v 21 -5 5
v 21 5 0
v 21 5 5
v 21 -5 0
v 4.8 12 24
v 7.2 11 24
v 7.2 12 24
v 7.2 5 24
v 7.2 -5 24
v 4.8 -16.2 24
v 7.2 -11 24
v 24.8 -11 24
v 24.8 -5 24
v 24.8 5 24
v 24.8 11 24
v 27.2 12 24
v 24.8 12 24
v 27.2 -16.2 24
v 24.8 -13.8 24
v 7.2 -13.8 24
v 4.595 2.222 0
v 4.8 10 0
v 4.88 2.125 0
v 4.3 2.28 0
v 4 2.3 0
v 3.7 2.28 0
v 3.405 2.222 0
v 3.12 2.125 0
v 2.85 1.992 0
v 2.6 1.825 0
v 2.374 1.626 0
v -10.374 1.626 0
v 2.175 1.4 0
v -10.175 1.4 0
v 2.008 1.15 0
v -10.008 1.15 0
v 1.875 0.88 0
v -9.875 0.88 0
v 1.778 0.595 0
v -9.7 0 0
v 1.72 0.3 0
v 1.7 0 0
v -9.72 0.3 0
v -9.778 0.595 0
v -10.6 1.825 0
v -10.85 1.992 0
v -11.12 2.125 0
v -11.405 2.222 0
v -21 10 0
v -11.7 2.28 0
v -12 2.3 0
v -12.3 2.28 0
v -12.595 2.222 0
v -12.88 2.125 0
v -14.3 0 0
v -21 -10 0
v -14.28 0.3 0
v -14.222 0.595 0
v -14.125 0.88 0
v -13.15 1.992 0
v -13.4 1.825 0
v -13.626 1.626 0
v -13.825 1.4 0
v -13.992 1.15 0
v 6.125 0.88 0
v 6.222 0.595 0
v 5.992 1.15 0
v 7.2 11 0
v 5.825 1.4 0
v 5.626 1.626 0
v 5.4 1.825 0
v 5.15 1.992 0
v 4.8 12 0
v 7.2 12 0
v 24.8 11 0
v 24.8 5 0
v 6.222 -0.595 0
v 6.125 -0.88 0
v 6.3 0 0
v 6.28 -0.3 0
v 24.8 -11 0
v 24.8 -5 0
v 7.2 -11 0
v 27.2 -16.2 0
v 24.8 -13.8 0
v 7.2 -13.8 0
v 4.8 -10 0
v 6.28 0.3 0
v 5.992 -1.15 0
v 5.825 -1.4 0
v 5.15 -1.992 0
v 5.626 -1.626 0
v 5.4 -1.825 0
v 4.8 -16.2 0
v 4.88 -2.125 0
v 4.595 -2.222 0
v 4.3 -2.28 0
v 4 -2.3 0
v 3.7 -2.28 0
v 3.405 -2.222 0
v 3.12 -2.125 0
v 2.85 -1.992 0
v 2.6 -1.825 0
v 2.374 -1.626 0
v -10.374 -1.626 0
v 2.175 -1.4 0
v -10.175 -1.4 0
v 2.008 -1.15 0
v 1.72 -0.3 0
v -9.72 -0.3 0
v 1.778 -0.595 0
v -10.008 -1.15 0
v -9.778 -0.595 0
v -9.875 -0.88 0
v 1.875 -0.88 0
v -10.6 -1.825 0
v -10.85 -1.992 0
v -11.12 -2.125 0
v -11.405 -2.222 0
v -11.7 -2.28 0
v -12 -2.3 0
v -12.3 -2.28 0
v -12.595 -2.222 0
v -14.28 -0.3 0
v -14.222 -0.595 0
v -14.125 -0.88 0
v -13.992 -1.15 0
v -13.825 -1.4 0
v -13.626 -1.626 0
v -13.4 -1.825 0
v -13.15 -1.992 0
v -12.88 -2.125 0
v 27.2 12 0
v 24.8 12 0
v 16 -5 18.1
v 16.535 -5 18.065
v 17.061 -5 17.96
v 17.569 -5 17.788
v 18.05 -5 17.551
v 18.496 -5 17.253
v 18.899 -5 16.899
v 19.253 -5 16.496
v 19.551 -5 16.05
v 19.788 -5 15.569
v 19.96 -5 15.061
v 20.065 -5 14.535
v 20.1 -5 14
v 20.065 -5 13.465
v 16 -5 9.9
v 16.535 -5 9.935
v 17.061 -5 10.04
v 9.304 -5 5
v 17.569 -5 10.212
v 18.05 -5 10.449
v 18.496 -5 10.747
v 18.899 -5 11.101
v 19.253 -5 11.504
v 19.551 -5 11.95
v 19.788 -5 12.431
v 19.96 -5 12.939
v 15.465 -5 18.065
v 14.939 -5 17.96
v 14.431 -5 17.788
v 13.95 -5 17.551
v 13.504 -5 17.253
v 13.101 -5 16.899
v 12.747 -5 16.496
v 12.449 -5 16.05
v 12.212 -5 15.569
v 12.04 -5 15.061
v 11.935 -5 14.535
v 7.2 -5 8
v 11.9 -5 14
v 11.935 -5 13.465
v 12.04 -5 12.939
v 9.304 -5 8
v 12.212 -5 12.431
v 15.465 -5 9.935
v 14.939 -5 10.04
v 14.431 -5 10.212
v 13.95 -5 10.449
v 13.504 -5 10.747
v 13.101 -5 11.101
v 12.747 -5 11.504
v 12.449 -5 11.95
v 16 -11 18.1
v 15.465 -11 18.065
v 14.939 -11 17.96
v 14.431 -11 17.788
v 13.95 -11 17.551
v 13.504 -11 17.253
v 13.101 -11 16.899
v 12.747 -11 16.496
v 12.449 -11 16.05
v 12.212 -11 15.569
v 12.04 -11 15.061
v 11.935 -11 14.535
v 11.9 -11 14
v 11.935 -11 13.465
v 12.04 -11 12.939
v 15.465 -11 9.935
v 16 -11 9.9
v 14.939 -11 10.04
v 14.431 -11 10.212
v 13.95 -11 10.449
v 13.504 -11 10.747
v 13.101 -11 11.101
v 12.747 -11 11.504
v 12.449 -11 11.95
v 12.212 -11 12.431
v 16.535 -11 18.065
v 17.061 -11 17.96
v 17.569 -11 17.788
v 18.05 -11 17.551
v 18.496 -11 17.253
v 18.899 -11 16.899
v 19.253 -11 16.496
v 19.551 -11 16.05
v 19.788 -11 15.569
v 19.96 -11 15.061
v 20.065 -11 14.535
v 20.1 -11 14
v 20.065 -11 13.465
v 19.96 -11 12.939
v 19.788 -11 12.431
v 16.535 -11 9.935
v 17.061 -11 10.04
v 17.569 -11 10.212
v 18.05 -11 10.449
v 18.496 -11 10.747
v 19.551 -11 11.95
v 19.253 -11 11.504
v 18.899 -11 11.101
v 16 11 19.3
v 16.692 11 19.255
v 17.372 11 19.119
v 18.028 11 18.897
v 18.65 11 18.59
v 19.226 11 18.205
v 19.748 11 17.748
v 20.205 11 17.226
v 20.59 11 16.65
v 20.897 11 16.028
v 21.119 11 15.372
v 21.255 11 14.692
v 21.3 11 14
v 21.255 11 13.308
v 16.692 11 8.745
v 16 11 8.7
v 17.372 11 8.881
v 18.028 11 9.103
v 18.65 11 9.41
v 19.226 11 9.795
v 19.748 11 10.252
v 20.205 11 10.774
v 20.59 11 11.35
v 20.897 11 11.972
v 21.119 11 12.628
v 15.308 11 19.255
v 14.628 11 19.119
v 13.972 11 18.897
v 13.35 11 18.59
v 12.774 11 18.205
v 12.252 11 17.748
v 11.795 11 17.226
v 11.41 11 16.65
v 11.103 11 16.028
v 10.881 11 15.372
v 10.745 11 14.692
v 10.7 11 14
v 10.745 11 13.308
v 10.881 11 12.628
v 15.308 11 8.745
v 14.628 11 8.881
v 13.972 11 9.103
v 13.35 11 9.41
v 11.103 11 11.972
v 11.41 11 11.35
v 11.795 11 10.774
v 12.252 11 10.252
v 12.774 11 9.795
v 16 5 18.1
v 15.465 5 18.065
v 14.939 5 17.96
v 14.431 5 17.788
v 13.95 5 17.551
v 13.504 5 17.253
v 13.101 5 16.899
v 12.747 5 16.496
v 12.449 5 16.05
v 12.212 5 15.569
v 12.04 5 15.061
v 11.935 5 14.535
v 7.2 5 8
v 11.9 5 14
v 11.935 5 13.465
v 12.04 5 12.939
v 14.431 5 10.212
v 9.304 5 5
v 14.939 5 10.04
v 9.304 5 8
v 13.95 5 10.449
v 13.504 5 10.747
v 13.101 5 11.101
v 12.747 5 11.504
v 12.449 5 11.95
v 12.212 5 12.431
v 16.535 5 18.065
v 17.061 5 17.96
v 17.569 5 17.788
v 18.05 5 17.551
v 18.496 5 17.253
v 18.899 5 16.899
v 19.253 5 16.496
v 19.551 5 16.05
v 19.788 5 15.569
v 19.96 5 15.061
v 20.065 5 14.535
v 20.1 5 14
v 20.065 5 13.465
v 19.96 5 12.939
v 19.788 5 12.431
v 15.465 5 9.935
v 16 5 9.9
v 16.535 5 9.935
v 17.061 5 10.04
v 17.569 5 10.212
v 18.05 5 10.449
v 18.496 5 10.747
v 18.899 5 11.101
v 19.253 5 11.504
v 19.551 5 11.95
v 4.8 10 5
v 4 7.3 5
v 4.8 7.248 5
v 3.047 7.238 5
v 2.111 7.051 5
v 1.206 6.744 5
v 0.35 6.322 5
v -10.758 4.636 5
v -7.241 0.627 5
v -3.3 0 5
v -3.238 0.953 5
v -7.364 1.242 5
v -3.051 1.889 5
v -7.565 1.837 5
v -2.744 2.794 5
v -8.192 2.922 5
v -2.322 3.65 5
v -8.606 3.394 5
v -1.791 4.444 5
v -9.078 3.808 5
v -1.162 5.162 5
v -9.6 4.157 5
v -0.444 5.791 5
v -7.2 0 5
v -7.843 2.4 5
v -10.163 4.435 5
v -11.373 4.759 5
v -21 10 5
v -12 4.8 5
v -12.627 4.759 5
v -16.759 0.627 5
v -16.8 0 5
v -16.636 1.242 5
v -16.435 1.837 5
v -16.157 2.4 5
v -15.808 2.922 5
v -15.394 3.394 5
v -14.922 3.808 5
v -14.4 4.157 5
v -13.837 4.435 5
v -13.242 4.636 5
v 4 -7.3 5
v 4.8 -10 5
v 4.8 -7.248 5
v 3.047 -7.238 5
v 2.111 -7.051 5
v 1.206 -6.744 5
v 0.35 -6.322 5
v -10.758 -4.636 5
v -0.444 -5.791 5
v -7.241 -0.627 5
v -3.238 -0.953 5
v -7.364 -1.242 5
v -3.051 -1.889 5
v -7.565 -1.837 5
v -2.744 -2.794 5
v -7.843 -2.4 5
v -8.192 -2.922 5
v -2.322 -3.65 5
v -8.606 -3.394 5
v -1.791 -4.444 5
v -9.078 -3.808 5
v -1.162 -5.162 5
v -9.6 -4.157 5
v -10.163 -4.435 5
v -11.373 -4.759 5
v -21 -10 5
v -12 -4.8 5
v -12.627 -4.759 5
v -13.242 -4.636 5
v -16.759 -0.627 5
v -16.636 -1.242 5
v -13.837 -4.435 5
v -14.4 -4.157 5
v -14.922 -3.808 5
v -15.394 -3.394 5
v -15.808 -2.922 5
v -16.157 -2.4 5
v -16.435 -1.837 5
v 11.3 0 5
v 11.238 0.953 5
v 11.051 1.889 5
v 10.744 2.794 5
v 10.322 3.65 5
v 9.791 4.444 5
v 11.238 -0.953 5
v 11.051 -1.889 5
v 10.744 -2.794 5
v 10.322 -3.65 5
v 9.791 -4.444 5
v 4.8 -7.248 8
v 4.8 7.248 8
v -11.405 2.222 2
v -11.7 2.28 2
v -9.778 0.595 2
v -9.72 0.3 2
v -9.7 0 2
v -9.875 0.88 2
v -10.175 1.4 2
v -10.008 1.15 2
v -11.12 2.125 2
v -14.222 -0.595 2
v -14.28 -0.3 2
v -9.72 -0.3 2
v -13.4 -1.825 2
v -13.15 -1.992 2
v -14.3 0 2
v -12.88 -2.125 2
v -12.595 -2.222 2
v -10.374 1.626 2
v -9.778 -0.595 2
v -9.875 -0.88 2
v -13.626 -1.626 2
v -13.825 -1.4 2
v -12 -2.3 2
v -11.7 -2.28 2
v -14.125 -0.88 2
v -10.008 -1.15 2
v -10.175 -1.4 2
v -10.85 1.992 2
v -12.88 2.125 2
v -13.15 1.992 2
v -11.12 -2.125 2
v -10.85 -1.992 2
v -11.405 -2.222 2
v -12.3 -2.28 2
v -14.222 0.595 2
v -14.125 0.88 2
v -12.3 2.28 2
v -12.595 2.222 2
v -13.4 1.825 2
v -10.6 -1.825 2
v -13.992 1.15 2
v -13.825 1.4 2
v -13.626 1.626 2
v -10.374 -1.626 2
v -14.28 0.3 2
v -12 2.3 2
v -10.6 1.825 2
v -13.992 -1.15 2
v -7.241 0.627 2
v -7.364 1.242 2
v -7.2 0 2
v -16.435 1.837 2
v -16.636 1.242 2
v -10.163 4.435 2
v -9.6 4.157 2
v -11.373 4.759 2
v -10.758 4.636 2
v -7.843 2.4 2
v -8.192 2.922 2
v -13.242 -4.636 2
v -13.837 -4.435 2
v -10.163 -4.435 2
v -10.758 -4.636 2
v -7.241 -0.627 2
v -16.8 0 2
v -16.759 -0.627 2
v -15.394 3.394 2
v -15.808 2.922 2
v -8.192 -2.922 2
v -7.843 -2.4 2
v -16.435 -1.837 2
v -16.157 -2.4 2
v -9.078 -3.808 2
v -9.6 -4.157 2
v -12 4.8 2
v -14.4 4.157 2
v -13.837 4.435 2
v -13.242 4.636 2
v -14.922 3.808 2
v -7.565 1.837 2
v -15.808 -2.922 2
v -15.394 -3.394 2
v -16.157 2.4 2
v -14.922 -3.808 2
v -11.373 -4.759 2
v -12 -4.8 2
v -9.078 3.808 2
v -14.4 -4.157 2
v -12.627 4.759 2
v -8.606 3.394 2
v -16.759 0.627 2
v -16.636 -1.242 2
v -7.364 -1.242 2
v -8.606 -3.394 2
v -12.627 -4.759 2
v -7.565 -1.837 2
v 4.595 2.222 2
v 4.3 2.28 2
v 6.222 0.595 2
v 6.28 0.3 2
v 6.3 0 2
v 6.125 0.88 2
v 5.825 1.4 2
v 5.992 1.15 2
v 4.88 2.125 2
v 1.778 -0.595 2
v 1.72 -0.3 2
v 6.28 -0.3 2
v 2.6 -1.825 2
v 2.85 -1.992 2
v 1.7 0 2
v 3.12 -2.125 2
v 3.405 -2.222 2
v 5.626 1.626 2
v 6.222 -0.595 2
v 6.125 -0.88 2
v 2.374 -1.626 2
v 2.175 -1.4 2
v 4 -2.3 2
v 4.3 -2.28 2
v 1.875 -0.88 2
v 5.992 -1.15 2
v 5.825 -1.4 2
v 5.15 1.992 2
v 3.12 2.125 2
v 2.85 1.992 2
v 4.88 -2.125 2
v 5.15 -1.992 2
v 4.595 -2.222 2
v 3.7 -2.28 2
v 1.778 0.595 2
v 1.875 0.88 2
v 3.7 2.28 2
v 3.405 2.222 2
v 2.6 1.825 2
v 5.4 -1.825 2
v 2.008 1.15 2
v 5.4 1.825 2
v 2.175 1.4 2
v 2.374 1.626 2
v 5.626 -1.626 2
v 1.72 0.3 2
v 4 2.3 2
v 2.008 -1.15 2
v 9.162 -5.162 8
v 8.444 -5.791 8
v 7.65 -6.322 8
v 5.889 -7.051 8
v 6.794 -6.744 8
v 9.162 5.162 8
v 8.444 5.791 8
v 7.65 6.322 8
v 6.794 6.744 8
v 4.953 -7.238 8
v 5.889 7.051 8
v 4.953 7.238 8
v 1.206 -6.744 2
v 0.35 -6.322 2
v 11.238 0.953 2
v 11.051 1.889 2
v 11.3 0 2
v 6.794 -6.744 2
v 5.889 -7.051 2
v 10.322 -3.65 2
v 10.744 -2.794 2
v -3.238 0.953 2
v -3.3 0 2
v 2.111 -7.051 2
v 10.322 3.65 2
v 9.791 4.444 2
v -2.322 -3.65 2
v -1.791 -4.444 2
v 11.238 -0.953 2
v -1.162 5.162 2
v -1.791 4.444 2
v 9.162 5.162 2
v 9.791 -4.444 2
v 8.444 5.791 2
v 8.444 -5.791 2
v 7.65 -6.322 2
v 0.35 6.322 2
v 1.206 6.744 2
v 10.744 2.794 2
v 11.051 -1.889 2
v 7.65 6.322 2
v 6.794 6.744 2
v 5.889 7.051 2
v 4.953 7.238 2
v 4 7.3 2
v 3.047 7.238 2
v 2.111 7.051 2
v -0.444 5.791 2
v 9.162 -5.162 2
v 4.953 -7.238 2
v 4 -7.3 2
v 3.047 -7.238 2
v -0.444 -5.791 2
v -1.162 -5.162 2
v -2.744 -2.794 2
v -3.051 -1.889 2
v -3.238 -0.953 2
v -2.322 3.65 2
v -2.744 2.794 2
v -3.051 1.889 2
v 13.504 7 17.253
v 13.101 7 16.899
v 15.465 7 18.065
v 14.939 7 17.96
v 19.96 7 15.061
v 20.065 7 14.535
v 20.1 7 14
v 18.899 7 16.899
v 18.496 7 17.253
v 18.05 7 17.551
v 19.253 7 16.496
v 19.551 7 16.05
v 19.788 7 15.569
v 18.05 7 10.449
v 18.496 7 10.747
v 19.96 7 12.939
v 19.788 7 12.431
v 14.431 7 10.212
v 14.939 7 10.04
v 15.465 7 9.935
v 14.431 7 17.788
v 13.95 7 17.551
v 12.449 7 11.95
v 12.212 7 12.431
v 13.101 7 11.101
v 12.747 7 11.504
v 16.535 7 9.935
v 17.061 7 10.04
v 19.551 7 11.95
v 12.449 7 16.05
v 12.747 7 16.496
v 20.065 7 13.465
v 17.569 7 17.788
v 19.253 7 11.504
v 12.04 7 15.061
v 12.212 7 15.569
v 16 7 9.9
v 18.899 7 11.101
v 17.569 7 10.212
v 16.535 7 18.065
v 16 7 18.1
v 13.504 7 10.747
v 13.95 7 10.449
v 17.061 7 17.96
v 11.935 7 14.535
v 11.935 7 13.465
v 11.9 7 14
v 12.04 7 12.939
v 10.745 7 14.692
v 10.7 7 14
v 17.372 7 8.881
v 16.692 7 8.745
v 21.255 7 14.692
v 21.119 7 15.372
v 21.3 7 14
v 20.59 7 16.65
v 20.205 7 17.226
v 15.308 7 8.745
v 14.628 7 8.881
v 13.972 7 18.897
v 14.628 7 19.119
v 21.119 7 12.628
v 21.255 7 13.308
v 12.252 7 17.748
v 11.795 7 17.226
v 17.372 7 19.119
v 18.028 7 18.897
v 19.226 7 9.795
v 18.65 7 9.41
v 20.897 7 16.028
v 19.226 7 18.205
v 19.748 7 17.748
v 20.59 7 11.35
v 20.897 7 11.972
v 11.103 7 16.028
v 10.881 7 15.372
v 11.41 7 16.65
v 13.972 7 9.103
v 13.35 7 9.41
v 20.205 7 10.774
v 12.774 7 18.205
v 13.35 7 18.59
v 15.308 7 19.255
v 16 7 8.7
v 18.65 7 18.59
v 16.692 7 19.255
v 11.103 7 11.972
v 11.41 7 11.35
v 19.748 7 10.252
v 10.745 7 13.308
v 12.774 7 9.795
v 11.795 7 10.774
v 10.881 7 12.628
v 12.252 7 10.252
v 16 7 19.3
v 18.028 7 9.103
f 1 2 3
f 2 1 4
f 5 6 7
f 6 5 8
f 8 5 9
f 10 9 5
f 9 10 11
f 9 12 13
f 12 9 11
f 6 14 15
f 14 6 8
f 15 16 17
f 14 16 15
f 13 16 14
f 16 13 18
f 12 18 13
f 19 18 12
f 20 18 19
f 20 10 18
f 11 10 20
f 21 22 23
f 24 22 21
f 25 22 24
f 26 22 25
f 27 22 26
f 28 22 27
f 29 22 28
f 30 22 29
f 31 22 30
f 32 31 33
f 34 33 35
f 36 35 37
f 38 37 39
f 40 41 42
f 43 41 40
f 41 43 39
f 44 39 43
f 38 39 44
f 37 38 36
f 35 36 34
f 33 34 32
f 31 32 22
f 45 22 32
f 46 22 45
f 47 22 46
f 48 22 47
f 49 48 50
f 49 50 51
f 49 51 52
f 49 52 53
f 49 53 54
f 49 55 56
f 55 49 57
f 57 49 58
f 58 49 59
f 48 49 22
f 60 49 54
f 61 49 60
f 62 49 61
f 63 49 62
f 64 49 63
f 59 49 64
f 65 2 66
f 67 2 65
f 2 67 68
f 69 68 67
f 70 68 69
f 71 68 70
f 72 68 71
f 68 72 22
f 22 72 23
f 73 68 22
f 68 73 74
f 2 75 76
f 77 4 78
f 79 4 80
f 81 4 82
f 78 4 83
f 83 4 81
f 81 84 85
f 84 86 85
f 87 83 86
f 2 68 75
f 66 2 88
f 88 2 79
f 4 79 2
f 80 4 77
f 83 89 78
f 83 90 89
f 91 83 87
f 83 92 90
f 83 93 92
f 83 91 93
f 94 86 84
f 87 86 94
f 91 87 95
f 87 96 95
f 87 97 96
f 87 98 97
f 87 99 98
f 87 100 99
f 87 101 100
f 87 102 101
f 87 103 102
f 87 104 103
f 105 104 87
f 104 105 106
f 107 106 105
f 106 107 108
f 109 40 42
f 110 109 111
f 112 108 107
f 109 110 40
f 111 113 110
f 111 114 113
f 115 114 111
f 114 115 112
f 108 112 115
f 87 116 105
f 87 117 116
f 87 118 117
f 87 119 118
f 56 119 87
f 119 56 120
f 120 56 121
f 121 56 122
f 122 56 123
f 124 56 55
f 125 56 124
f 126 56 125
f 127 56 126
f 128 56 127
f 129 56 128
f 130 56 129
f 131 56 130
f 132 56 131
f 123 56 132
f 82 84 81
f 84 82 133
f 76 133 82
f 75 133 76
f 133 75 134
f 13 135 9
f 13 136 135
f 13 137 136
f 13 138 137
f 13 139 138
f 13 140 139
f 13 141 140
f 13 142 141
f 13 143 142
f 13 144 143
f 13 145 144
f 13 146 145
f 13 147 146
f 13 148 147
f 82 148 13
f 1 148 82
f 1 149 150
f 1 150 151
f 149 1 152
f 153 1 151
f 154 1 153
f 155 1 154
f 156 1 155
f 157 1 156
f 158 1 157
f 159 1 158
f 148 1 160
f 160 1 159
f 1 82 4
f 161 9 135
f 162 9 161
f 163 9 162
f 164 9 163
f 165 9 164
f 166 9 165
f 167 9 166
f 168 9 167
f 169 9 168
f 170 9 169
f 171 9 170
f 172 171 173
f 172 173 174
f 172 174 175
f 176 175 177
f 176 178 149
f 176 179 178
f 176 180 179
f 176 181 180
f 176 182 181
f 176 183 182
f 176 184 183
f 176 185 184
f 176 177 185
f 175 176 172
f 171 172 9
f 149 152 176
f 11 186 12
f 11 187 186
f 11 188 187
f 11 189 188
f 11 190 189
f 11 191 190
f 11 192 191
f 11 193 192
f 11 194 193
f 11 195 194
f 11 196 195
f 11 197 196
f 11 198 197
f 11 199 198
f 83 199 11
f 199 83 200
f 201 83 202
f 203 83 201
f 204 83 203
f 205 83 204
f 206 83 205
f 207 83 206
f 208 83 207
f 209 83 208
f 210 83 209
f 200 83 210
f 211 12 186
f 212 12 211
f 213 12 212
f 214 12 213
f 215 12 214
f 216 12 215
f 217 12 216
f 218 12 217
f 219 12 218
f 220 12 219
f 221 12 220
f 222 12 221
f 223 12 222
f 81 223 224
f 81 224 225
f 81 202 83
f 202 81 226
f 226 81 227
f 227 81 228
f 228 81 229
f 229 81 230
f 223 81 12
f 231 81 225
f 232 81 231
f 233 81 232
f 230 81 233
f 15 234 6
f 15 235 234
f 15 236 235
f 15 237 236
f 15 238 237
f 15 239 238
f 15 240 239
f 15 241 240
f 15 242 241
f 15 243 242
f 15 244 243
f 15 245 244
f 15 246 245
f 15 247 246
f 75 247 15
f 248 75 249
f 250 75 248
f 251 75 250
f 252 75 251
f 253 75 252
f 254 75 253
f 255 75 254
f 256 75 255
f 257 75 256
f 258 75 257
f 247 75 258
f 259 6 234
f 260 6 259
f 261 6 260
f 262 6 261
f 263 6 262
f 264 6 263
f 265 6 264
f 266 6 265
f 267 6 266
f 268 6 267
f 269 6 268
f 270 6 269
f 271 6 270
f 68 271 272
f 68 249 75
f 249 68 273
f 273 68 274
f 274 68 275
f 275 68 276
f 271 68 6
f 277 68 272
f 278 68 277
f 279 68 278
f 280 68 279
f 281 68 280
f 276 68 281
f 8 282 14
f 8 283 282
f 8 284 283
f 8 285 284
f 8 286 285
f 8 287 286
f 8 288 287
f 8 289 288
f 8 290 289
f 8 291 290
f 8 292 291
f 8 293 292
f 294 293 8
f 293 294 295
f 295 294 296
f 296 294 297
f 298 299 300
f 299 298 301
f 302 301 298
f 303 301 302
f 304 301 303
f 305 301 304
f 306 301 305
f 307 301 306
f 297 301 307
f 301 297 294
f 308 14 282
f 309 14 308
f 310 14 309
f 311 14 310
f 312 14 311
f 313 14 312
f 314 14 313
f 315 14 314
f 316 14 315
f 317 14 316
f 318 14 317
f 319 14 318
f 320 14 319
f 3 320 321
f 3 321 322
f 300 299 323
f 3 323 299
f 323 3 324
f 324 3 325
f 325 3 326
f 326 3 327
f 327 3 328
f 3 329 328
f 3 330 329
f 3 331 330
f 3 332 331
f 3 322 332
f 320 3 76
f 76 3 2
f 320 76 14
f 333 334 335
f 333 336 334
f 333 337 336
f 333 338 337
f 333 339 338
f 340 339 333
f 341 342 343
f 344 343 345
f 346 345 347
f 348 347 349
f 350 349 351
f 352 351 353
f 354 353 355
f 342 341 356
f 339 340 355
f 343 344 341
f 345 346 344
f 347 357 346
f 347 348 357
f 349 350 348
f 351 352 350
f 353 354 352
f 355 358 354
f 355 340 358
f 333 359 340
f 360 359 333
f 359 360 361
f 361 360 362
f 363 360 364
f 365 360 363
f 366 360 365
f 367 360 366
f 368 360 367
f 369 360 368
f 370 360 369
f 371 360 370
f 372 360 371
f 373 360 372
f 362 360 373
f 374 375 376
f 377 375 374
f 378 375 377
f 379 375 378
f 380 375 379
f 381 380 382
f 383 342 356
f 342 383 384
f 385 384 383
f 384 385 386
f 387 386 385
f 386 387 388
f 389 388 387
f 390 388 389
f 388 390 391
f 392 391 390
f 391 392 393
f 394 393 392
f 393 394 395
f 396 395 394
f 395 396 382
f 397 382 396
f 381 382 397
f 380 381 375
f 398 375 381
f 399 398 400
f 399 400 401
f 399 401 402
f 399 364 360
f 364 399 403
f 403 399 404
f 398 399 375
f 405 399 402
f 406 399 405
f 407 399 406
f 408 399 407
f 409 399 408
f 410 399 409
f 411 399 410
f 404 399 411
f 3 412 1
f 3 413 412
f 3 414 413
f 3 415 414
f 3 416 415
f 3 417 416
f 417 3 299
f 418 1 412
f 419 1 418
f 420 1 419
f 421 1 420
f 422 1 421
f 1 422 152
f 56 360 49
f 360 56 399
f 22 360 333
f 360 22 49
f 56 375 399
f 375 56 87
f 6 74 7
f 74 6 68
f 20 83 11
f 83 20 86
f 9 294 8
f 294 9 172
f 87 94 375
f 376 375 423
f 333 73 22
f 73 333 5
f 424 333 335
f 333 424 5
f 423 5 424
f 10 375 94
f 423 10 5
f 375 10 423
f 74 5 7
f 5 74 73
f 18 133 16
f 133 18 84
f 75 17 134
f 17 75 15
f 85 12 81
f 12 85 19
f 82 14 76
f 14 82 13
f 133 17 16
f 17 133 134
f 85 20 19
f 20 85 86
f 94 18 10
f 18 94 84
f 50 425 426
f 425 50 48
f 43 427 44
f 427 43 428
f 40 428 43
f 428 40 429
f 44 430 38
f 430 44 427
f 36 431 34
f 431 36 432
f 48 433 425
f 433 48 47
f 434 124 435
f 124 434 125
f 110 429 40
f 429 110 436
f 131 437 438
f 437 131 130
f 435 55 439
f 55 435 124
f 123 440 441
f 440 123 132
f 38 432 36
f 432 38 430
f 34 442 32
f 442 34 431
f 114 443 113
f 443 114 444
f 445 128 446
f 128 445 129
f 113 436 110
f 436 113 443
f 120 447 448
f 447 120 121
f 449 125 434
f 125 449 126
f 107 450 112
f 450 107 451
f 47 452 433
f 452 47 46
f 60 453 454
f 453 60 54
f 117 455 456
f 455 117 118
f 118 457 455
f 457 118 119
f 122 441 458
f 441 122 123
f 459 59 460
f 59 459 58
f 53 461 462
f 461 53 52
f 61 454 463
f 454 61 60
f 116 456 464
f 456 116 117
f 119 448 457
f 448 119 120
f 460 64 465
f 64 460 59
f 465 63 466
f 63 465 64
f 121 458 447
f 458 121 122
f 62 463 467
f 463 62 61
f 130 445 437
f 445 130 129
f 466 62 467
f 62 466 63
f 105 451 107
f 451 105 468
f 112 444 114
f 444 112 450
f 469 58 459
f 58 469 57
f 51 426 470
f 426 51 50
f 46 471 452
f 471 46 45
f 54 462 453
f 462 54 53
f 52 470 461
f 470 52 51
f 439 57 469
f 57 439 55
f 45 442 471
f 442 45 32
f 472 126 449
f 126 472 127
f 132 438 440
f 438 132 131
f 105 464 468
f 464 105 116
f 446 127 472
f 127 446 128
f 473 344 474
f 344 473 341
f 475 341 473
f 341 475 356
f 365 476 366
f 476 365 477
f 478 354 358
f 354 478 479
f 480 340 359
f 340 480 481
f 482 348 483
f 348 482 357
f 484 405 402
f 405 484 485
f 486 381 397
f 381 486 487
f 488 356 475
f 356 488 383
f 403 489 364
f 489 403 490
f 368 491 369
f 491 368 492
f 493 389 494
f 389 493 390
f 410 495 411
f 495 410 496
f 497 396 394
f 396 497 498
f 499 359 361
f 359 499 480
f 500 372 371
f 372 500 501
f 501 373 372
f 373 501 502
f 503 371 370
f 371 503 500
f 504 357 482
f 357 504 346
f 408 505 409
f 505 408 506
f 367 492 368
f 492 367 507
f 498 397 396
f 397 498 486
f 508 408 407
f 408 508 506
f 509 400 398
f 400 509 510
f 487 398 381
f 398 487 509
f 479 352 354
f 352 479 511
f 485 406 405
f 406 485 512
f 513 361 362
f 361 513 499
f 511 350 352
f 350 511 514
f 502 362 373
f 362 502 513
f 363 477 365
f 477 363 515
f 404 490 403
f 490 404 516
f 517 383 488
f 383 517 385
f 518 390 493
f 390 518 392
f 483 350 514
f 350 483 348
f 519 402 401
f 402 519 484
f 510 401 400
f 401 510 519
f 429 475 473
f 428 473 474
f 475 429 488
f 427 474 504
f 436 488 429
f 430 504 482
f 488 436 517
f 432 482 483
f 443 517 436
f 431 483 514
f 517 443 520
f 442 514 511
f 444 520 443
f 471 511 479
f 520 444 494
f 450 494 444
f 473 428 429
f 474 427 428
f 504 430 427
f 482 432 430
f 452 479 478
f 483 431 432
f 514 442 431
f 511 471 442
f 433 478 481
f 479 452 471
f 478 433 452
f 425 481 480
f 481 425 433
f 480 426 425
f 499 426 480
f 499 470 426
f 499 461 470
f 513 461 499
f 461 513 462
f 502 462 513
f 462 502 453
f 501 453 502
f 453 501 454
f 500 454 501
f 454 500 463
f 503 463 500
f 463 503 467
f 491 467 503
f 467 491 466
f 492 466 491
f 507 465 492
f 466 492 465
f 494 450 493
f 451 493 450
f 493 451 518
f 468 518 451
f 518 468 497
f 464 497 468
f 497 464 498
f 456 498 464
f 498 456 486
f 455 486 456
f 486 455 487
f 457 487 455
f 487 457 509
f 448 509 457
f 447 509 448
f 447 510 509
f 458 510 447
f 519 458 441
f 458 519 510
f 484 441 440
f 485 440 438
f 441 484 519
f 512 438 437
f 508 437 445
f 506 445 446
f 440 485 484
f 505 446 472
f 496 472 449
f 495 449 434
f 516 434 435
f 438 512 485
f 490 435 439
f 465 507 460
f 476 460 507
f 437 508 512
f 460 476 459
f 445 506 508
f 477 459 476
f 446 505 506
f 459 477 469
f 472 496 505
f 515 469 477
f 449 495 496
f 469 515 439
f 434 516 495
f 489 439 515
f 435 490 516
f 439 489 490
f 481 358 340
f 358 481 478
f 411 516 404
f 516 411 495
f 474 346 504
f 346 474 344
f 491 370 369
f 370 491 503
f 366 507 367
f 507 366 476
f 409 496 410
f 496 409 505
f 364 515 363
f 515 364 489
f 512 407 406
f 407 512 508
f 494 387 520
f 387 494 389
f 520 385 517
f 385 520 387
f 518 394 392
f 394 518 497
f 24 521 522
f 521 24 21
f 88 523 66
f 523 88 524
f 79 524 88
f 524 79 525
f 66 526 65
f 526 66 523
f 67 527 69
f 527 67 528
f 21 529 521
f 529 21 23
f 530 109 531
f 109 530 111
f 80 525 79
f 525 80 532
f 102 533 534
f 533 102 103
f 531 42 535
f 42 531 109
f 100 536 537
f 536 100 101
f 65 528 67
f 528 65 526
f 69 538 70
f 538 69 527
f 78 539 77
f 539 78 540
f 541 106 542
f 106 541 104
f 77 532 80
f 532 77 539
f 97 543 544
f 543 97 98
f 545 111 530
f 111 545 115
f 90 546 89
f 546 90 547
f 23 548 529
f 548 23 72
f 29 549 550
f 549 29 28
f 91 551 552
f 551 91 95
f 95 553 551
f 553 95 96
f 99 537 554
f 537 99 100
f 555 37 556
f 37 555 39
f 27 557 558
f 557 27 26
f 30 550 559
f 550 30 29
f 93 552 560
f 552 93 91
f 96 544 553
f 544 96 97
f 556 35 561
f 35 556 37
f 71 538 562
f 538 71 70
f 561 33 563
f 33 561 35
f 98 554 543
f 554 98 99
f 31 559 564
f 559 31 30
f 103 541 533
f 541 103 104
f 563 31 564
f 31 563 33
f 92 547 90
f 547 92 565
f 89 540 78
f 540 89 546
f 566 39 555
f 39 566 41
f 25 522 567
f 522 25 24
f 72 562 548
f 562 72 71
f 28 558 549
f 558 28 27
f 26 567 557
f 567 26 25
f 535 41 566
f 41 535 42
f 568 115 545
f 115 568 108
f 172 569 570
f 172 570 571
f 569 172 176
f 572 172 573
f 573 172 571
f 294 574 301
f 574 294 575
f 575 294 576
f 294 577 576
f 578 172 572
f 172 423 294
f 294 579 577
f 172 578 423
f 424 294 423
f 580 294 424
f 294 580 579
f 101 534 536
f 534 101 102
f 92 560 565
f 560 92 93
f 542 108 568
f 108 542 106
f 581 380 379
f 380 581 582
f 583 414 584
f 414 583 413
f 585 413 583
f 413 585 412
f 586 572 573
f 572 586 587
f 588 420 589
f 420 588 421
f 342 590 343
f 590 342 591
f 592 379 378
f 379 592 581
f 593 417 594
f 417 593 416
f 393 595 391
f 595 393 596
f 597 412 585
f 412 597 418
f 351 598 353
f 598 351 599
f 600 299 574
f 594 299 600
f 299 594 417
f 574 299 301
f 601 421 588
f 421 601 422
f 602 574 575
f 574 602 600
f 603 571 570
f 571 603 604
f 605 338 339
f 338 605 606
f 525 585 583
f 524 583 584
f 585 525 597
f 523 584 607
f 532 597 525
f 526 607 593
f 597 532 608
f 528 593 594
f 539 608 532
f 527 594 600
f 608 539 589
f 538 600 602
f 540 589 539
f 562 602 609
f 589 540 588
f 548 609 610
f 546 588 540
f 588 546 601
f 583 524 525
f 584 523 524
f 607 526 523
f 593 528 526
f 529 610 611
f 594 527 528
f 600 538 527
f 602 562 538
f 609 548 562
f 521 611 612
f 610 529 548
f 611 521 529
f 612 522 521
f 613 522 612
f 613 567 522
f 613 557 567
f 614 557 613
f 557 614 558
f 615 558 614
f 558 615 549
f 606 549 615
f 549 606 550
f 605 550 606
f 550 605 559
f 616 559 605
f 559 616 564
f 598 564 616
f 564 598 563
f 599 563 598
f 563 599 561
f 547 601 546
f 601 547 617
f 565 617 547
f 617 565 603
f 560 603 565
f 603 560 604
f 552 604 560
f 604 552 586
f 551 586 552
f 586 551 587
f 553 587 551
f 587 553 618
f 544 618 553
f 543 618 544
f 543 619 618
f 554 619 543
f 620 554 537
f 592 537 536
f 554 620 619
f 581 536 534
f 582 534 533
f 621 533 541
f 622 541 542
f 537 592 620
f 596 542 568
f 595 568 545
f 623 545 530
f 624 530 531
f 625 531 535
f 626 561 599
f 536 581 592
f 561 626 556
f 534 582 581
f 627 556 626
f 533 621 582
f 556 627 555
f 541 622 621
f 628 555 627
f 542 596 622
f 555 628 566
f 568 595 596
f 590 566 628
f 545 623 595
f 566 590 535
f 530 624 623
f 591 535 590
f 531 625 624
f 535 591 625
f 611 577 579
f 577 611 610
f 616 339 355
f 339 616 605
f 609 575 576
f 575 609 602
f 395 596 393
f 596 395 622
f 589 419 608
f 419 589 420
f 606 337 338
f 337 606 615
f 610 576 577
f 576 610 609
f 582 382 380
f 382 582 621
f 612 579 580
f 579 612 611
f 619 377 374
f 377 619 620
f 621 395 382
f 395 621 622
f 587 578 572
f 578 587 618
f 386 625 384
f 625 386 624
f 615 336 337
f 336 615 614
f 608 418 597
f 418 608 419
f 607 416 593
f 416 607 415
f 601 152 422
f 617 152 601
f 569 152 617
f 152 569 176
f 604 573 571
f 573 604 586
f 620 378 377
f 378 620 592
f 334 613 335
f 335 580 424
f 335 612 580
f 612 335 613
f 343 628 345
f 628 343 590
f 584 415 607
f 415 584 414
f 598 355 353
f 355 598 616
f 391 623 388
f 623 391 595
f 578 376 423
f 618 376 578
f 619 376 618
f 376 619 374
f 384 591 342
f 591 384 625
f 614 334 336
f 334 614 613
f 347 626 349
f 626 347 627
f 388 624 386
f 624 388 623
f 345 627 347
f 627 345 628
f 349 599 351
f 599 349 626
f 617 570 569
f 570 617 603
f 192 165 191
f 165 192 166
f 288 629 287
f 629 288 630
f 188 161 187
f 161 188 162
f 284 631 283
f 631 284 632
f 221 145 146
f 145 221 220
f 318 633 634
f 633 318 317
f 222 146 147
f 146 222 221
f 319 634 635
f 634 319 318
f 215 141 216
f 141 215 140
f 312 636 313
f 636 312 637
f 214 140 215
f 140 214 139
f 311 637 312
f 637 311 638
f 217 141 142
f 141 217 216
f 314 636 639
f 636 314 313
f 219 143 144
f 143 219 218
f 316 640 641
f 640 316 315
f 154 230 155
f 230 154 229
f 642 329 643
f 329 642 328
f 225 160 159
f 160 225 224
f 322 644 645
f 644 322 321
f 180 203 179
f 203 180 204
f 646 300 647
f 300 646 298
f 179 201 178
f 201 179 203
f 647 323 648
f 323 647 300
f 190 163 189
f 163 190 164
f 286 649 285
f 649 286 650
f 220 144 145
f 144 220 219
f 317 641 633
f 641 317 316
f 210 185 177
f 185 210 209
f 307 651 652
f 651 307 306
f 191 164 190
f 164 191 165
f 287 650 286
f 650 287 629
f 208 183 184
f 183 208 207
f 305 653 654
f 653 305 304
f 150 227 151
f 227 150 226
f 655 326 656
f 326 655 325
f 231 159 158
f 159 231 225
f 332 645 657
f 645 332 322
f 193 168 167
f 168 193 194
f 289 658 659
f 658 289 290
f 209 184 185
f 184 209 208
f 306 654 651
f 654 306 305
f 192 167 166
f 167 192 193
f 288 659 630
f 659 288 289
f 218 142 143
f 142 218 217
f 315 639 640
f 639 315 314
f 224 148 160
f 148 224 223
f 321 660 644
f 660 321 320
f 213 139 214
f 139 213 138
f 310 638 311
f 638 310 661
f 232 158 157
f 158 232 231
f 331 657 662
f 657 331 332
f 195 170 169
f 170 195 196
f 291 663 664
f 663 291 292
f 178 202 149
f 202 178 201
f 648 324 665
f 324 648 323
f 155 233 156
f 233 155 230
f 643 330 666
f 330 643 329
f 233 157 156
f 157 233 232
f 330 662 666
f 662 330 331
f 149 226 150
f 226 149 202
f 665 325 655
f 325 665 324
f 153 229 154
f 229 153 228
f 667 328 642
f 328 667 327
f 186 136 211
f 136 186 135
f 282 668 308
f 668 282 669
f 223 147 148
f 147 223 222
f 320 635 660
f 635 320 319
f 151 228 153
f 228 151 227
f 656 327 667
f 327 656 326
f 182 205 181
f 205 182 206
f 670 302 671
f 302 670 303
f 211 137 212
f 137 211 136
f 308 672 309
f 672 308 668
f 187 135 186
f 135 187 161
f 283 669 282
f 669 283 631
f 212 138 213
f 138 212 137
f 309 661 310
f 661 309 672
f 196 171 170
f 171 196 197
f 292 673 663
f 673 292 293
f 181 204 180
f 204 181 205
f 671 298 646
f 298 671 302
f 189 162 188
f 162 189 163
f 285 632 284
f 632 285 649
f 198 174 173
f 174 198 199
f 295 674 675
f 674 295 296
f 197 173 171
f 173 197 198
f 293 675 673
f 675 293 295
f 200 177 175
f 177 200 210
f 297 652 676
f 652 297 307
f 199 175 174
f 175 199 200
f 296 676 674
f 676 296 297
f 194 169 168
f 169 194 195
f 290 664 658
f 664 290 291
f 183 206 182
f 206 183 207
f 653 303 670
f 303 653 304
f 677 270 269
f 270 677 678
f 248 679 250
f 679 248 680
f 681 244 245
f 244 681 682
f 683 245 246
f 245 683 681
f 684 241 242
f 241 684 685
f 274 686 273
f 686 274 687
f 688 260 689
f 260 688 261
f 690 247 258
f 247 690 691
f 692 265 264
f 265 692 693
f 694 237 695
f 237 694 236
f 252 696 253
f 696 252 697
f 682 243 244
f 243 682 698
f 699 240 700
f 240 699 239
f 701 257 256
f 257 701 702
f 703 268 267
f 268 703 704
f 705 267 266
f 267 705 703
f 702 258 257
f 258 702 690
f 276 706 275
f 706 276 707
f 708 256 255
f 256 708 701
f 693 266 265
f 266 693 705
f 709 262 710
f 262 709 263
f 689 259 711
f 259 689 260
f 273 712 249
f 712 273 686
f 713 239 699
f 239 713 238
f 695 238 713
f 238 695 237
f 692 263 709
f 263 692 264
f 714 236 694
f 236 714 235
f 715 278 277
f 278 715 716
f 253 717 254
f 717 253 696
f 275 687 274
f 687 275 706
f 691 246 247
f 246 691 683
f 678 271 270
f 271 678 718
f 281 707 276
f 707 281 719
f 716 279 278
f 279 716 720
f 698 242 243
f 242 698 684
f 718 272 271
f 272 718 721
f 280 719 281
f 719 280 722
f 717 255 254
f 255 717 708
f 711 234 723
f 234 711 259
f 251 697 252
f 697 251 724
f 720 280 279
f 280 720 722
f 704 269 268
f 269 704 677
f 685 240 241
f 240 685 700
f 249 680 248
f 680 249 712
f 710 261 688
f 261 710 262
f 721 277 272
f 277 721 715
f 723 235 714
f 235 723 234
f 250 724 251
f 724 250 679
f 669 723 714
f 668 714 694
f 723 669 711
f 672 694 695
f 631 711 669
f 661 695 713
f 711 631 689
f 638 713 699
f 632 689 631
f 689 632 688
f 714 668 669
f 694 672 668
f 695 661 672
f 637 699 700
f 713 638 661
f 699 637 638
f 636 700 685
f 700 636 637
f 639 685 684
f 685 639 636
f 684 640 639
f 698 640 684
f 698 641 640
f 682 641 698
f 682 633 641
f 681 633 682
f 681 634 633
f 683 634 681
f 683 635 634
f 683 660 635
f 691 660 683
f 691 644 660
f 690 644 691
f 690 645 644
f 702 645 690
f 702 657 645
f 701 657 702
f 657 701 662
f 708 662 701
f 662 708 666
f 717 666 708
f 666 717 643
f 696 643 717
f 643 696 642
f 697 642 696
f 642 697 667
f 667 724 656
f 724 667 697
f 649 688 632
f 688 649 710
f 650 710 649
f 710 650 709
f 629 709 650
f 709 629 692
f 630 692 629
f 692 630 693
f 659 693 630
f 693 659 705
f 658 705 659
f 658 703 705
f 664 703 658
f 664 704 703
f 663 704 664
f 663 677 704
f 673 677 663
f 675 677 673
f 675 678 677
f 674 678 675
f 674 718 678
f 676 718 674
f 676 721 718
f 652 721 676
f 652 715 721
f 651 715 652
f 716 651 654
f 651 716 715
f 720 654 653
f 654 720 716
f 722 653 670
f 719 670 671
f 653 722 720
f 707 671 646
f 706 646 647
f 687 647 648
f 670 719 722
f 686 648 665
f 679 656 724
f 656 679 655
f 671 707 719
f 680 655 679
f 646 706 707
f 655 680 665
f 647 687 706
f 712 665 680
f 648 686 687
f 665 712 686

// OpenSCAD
// P2-96 print coupons only. Installed P2-93d/g geometry is unchanged.
use <p293g-tilt-candidate.scad>
use <p293d-arch-candidate.scad>

part = "coupon_foot_seats";

// Local samples of the real X240 and X230 washer seats plus one complete
// Z80 pin clevis. Thin test-only webs keep the coupon a single body.
module coupon_foot_seats() {
  difference() {
    union() {
      // Compact connected carrier; the sampled bores/recesses retain the
      // production diameters and seat stacks.
      translate([0,0,2.5]) cube([42,20,5], center=true);
      for (y=[-8,8]) translate([16,y,12]) cube([10,6,24], center=true);
      // Non-functional spine keeps the four pin-seat quadrants printable;
      // it stays clear of the real bore/head-seat surfaces.
      translate([6,-2,12]) cube([2.4,28,24], center=true);
      for (y=[-8,8]) translate([8.5,y,12]) cube([5,6,24], center=true);
      translate([26,-2,12]) cube([2.4,28,24], center=true);
      for (y=[-8,8]) translate([23.5,y,12]) cube([5,6,24], center=true);
      translate([16,-15,12]) cube([22.4,2.4,24], center=true);
    }
    // X240 OD9.6 seat and X230 OD14.6 seat.
    translate([-12,0,-1]) cylinder(d=4.6,h=9,$fn=48);
    translate([-12,0,2]) cylinder(d=9.6,h=6,$fn=48);
    translate([4,0,-1]) cylinder(d=4.6,h=9,$fn=48);
    translate([4,0,2]) cylinder(d=14.6,h=6,$fn=48);
    // One real foot pin stack: Ø8.2 sleeve bore and Ø10.6 head recess.
    translate([16,0,14]) rotate([90,0,0]) cylinder(d=8.2,h=24,center=true,$fn=48);
    translate([16,9,14]) rotate([90,0,0]) cylinder(d=10.6,h=4,center=true,$fn=48);
  }
}

// Real knee section containing both through-pin bores at Z80 and Z114.
module coupon_knee_pins() {
  difference() {
    translate([0,0,17]) cube([12,20,46],center=true);
    for(z=[0,34]) translate([0,0,z]) rotate([90,0,0]) cylinder(d=4.6,h=30,center=true,$fn=48);
  }
}

if (part == "coupon_foot_seats") coupon_foot_seats();
else if (part == "coupon_knee_pins") coupon_knee_pins();
else assert(false, str("unknown P2-96 coupon: ", part));
